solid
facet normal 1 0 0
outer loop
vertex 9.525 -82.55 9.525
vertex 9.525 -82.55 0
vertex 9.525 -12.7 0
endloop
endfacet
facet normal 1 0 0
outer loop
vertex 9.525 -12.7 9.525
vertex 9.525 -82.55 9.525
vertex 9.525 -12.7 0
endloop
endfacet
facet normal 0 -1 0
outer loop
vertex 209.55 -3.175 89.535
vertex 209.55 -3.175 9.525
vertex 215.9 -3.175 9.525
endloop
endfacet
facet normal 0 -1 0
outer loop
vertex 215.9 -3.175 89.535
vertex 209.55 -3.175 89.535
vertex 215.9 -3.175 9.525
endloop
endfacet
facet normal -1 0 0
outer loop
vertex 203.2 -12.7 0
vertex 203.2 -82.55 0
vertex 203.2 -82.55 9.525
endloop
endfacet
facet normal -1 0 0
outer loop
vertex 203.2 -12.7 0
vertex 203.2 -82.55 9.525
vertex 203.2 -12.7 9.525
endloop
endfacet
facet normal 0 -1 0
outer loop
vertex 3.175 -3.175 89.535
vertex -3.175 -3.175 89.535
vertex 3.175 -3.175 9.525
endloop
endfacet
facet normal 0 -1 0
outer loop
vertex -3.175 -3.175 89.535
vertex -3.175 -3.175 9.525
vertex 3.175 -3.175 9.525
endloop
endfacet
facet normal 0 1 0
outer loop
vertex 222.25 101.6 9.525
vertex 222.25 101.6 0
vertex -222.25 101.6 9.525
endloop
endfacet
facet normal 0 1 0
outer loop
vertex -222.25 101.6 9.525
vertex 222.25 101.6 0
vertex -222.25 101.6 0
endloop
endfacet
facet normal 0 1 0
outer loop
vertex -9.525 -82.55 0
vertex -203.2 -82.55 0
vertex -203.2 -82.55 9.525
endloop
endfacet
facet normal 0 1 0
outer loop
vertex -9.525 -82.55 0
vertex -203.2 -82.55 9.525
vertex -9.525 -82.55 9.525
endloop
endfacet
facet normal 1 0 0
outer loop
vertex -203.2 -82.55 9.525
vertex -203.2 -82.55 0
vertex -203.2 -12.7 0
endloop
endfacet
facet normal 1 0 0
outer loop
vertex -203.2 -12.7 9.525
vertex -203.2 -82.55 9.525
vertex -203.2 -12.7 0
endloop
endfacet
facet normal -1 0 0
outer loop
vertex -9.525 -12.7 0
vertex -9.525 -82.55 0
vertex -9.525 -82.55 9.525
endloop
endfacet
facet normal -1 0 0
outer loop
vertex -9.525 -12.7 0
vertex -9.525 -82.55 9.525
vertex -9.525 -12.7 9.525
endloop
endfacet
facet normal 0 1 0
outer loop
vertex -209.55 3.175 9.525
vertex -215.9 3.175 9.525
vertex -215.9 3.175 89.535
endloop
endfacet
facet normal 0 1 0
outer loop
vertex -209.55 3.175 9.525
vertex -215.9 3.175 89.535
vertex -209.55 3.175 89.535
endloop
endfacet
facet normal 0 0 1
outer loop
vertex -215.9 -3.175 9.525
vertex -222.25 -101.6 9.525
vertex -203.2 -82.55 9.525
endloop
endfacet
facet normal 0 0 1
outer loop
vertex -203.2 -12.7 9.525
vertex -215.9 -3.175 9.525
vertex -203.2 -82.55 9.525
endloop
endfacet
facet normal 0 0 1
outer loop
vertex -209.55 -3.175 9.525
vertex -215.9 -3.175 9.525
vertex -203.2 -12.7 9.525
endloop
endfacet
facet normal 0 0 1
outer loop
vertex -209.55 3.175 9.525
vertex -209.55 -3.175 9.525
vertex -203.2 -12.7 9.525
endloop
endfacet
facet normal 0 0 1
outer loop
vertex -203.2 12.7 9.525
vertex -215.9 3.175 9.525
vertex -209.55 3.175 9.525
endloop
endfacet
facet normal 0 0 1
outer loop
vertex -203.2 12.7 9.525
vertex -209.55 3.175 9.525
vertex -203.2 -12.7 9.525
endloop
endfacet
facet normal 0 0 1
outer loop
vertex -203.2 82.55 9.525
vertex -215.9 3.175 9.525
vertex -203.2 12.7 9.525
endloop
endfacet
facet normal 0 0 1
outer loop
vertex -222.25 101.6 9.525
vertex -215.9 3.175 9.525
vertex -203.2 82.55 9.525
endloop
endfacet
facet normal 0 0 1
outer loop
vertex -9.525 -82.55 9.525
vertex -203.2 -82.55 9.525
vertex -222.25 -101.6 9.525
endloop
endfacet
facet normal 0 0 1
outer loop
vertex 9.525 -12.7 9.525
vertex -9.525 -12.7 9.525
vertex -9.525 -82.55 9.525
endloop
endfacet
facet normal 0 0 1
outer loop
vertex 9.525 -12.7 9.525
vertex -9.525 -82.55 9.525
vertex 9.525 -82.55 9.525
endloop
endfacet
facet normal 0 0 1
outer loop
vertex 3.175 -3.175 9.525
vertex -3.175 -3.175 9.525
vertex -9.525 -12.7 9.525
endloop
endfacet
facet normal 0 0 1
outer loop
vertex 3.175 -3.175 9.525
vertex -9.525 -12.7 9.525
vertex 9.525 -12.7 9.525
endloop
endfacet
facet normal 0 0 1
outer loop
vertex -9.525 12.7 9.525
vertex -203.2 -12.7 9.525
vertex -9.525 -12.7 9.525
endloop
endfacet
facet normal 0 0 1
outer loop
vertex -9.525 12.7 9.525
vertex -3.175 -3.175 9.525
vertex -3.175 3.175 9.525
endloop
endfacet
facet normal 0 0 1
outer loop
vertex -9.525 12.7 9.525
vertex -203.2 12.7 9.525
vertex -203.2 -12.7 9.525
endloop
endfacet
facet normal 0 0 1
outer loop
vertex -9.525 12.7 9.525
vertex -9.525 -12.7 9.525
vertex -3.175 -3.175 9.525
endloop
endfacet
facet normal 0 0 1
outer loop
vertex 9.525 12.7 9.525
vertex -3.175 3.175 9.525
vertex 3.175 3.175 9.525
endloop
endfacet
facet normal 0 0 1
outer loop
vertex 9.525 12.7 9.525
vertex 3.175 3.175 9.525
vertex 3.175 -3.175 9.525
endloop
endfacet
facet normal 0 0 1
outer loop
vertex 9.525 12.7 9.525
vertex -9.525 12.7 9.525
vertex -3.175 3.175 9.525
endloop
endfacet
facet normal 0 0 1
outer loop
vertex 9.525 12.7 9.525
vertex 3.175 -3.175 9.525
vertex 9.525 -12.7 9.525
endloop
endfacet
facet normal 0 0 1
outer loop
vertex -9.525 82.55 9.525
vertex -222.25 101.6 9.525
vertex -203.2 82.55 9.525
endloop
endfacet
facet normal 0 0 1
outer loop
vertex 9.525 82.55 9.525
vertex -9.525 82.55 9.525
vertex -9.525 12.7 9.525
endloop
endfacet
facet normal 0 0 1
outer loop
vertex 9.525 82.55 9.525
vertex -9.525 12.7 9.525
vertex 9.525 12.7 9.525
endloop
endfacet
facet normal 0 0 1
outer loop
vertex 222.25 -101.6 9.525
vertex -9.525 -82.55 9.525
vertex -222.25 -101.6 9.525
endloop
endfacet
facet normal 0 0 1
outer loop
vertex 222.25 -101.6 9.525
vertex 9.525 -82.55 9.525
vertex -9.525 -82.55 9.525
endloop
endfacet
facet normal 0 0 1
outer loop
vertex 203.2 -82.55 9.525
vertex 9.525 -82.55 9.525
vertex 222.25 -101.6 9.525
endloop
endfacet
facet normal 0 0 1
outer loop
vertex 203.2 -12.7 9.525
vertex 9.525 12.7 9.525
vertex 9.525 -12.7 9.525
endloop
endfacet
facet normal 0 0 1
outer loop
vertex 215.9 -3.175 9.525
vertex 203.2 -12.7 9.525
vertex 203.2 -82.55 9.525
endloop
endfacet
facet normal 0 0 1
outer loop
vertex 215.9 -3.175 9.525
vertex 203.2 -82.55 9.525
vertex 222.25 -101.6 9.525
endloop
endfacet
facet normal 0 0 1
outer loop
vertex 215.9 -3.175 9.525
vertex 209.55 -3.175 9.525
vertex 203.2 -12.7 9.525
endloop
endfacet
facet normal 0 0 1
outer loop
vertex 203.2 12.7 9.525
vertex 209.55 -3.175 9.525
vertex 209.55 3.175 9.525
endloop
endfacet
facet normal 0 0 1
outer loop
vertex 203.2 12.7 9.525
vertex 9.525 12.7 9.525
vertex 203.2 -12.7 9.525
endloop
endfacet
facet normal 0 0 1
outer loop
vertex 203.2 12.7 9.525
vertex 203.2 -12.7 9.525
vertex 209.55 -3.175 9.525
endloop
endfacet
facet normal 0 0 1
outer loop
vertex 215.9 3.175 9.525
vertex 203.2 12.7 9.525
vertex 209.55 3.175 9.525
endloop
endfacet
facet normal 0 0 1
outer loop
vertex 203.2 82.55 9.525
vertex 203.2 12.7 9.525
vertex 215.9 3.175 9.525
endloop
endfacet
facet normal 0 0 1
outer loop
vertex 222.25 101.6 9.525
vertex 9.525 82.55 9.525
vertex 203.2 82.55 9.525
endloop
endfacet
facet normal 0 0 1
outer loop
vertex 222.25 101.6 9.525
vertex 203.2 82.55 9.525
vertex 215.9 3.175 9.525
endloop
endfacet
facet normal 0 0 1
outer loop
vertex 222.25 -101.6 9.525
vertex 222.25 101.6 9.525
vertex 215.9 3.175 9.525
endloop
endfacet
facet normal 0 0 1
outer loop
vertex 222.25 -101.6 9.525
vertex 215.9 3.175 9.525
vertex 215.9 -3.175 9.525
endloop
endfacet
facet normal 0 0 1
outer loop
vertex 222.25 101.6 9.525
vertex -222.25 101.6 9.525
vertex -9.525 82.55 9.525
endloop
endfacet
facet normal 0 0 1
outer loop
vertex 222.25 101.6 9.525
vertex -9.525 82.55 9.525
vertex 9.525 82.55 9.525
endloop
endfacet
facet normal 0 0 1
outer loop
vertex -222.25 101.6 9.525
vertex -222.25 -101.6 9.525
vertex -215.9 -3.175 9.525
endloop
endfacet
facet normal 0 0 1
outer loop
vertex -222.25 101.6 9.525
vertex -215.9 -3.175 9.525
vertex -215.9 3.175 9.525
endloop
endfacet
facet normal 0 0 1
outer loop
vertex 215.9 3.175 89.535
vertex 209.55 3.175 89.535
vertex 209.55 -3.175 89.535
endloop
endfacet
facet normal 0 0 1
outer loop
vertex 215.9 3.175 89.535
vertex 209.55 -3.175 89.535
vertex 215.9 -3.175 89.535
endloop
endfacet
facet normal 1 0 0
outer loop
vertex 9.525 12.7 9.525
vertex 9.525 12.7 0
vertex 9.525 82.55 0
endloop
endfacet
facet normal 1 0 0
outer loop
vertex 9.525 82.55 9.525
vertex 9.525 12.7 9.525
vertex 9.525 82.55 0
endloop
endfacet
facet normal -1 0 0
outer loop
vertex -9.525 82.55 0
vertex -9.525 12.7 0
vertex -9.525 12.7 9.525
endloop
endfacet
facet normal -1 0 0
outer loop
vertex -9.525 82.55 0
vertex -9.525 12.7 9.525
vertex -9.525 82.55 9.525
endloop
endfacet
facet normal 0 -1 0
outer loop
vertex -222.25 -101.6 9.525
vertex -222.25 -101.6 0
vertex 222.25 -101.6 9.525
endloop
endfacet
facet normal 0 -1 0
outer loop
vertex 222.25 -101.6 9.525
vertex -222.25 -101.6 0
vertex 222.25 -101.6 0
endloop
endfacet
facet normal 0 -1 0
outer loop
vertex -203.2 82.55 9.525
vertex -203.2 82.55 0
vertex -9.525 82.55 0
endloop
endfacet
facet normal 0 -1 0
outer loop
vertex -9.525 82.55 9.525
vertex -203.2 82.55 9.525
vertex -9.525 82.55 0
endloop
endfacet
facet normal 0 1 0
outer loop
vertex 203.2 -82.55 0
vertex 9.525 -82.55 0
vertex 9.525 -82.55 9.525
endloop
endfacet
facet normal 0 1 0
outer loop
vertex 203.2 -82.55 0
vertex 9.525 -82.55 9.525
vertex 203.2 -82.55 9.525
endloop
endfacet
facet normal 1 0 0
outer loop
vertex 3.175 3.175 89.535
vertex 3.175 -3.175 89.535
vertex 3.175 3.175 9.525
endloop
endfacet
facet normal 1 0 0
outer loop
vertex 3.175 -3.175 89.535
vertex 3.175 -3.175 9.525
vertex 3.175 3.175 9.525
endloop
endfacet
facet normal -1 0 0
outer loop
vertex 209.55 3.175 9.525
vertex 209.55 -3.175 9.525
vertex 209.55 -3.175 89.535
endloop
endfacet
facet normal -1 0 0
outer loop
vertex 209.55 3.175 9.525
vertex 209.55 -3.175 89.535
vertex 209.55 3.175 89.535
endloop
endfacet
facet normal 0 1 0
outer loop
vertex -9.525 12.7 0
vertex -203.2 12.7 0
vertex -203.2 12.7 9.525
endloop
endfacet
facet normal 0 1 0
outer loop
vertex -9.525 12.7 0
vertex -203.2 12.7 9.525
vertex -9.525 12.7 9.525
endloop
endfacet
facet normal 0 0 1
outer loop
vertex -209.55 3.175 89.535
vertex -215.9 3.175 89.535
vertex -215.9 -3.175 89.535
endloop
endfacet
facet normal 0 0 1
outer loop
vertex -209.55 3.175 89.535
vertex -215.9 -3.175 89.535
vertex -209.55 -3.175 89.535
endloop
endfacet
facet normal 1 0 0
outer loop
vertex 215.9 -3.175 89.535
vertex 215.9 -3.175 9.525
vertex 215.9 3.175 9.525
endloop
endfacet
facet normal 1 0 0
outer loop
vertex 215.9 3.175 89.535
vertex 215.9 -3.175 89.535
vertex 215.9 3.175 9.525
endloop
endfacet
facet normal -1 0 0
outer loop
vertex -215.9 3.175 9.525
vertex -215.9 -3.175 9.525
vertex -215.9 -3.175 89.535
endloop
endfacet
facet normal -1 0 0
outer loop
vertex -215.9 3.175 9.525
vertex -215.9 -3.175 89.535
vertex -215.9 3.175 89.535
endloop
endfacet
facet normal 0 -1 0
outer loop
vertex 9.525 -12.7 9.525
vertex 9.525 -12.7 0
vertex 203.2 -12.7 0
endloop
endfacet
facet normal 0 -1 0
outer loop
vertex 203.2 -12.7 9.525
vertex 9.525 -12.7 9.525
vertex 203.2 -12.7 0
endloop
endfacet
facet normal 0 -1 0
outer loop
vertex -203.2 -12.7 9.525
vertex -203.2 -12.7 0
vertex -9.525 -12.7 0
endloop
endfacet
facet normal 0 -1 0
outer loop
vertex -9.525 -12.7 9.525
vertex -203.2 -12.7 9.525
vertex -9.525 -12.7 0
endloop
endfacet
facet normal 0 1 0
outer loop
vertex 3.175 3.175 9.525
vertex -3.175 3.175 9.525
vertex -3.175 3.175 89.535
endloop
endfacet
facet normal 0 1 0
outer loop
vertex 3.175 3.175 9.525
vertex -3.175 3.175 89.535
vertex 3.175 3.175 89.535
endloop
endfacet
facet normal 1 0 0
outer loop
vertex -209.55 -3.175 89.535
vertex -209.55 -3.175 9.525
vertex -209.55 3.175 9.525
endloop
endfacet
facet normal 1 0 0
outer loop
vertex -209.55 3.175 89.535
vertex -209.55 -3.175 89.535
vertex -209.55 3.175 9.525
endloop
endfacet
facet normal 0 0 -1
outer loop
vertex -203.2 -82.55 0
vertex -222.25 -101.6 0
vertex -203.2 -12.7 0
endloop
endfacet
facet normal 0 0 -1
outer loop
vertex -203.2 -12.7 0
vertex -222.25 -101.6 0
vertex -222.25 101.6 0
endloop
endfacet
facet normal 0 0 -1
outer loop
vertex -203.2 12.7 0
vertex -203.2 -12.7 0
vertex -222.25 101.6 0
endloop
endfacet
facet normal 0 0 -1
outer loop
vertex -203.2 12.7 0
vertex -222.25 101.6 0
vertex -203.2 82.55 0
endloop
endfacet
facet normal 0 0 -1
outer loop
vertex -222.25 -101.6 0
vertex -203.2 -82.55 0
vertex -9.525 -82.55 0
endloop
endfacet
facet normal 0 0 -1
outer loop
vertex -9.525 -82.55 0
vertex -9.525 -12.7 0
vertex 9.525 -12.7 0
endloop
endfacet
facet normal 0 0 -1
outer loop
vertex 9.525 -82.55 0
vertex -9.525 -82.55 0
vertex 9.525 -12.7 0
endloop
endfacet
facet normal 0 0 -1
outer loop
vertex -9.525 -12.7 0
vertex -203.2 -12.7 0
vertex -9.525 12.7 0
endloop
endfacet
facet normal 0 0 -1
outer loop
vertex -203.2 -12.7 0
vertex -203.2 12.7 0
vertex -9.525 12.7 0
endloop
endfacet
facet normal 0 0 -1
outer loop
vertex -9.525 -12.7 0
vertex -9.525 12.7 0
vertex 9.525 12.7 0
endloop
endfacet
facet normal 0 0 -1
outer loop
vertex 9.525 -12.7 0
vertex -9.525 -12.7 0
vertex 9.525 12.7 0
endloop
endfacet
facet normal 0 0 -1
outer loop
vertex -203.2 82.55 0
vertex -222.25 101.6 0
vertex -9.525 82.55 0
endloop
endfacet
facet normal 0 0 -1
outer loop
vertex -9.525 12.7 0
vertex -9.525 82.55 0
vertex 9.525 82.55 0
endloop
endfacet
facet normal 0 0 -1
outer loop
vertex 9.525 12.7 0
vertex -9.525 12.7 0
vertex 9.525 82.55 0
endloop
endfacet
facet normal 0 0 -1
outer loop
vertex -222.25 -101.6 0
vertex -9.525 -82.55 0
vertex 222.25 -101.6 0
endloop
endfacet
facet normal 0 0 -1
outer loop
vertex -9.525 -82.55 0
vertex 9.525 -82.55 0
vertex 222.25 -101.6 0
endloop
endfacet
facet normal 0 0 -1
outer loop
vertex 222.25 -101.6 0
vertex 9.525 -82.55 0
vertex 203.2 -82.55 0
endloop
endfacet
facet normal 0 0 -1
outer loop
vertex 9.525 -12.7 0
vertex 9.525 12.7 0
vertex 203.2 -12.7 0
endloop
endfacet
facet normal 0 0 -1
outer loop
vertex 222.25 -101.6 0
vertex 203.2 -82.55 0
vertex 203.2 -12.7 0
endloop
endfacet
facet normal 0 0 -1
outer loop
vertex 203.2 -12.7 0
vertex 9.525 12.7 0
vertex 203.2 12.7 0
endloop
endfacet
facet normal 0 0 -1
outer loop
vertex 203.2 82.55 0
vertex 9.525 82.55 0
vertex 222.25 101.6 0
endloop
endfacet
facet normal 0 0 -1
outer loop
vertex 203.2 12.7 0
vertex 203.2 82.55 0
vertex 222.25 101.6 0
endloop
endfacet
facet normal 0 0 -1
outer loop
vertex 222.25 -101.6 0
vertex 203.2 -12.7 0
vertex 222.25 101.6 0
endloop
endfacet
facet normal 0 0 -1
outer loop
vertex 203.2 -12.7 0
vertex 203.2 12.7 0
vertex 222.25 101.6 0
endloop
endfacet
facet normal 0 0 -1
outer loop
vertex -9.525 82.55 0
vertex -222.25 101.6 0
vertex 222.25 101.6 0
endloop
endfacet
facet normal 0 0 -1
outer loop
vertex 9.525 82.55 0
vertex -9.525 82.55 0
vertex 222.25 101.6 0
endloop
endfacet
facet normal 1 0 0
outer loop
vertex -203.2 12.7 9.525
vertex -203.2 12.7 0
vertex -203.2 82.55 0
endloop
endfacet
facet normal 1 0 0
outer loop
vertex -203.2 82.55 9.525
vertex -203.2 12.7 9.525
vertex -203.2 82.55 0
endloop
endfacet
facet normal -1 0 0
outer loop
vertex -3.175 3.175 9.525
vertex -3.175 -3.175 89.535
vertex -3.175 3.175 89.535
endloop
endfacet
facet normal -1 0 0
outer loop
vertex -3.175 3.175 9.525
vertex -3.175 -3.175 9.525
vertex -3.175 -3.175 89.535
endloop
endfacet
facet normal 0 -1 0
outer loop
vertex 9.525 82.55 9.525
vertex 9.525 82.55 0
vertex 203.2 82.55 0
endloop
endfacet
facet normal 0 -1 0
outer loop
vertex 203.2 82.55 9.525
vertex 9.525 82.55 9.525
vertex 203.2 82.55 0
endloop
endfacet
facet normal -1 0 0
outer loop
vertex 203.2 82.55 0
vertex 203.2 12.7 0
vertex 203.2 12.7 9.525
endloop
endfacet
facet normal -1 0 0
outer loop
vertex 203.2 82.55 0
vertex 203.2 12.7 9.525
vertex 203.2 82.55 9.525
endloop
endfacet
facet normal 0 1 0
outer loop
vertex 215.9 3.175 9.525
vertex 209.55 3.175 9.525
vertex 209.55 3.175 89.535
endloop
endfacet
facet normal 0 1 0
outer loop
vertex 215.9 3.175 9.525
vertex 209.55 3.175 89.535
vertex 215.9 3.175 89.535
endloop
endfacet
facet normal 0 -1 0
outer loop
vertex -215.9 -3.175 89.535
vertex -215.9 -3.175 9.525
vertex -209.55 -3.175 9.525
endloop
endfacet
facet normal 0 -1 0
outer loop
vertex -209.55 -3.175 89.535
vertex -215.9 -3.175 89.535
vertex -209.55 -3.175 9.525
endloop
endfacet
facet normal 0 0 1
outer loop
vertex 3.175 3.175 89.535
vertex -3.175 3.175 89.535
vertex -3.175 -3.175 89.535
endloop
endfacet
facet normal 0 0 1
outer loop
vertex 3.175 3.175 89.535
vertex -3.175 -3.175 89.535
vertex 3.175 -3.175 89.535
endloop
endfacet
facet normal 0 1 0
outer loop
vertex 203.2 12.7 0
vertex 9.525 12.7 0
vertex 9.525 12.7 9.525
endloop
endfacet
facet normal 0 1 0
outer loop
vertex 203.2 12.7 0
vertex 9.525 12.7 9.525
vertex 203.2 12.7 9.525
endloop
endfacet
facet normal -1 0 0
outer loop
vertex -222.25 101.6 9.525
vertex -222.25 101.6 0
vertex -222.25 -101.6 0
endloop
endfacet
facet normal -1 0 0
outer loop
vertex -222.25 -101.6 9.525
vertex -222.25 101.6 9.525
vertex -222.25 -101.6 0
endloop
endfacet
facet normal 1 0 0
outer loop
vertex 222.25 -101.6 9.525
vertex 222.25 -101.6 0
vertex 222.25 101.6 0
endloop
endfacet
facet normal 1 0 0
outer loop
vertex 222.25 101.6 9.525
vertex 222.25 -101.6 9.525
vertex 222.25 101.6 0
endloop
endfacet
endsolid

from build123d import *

# Parameters (mm, degrees)
F0_W     = 193.675
F0_H     = 69.85
F1_DEPTH = 9.525
F2_W     = 6.35
F2_H     = 6.35
F3_DEPTH = 2.54
F4_W     = 6.35
F4_H     = 6.35
F5_DEPTH = 77.47


with BuildPart() as f1:
    # F0 (on Top) → F1 (new body)
    with BuildSketch(Plane.XY):
        Polygon((222.25, -101.6), (222.25, 101.6), (-222.25, 101.6), (-222.25, -12.7), (-222.25, -101.6), align=None)
        with Locations((-106.3625, -47.625)):
            Rectangle(F0_W, F0_H, mode=Mode.SUBTRACT)
        with Locations((106.3625, -47.625)):
            Rectangle(F0_W, F0_H, mode=Mode.SUBTRACT)
        with Locations((-106.3625, 47.625)):
            Rectangle(F0_W, F0_H, mode=Mode.SUBTRACT)
        with Locations((106.3625, 47.625)):
            Rectangle(F0_W, F0_H, mode=Mode.SUBTRACT)
    extrude(amount=F1_DEPTH)

    # F2 (on face) → F3 (join)
    with BuildSketch(Plane.XY.offset(9.525)):
        with Locations((-212.725, 0)):
            Rectangle(F2_W, F2_H)
        with Locations((212.725, 0)):
            Rectangle(F2_W, F2_H)
        Rectangle(F2_W, F2_H)
    extrude(amount=F3_DEPTH)

    # F4 (on face) → F5 (join)
    with BuildSketch(Plane.XY.offset(12.065)):
        Rectangle(F4_W, F4_H)
        with Locations((212.725, 0)):
            Rectangle(F4_W, F4_H)
        with Locations((-212.725, 0)):
            Rectangle(F4_W, F4_H)
    extrude(amount=F5_DEPTH)


solid = f1.part
